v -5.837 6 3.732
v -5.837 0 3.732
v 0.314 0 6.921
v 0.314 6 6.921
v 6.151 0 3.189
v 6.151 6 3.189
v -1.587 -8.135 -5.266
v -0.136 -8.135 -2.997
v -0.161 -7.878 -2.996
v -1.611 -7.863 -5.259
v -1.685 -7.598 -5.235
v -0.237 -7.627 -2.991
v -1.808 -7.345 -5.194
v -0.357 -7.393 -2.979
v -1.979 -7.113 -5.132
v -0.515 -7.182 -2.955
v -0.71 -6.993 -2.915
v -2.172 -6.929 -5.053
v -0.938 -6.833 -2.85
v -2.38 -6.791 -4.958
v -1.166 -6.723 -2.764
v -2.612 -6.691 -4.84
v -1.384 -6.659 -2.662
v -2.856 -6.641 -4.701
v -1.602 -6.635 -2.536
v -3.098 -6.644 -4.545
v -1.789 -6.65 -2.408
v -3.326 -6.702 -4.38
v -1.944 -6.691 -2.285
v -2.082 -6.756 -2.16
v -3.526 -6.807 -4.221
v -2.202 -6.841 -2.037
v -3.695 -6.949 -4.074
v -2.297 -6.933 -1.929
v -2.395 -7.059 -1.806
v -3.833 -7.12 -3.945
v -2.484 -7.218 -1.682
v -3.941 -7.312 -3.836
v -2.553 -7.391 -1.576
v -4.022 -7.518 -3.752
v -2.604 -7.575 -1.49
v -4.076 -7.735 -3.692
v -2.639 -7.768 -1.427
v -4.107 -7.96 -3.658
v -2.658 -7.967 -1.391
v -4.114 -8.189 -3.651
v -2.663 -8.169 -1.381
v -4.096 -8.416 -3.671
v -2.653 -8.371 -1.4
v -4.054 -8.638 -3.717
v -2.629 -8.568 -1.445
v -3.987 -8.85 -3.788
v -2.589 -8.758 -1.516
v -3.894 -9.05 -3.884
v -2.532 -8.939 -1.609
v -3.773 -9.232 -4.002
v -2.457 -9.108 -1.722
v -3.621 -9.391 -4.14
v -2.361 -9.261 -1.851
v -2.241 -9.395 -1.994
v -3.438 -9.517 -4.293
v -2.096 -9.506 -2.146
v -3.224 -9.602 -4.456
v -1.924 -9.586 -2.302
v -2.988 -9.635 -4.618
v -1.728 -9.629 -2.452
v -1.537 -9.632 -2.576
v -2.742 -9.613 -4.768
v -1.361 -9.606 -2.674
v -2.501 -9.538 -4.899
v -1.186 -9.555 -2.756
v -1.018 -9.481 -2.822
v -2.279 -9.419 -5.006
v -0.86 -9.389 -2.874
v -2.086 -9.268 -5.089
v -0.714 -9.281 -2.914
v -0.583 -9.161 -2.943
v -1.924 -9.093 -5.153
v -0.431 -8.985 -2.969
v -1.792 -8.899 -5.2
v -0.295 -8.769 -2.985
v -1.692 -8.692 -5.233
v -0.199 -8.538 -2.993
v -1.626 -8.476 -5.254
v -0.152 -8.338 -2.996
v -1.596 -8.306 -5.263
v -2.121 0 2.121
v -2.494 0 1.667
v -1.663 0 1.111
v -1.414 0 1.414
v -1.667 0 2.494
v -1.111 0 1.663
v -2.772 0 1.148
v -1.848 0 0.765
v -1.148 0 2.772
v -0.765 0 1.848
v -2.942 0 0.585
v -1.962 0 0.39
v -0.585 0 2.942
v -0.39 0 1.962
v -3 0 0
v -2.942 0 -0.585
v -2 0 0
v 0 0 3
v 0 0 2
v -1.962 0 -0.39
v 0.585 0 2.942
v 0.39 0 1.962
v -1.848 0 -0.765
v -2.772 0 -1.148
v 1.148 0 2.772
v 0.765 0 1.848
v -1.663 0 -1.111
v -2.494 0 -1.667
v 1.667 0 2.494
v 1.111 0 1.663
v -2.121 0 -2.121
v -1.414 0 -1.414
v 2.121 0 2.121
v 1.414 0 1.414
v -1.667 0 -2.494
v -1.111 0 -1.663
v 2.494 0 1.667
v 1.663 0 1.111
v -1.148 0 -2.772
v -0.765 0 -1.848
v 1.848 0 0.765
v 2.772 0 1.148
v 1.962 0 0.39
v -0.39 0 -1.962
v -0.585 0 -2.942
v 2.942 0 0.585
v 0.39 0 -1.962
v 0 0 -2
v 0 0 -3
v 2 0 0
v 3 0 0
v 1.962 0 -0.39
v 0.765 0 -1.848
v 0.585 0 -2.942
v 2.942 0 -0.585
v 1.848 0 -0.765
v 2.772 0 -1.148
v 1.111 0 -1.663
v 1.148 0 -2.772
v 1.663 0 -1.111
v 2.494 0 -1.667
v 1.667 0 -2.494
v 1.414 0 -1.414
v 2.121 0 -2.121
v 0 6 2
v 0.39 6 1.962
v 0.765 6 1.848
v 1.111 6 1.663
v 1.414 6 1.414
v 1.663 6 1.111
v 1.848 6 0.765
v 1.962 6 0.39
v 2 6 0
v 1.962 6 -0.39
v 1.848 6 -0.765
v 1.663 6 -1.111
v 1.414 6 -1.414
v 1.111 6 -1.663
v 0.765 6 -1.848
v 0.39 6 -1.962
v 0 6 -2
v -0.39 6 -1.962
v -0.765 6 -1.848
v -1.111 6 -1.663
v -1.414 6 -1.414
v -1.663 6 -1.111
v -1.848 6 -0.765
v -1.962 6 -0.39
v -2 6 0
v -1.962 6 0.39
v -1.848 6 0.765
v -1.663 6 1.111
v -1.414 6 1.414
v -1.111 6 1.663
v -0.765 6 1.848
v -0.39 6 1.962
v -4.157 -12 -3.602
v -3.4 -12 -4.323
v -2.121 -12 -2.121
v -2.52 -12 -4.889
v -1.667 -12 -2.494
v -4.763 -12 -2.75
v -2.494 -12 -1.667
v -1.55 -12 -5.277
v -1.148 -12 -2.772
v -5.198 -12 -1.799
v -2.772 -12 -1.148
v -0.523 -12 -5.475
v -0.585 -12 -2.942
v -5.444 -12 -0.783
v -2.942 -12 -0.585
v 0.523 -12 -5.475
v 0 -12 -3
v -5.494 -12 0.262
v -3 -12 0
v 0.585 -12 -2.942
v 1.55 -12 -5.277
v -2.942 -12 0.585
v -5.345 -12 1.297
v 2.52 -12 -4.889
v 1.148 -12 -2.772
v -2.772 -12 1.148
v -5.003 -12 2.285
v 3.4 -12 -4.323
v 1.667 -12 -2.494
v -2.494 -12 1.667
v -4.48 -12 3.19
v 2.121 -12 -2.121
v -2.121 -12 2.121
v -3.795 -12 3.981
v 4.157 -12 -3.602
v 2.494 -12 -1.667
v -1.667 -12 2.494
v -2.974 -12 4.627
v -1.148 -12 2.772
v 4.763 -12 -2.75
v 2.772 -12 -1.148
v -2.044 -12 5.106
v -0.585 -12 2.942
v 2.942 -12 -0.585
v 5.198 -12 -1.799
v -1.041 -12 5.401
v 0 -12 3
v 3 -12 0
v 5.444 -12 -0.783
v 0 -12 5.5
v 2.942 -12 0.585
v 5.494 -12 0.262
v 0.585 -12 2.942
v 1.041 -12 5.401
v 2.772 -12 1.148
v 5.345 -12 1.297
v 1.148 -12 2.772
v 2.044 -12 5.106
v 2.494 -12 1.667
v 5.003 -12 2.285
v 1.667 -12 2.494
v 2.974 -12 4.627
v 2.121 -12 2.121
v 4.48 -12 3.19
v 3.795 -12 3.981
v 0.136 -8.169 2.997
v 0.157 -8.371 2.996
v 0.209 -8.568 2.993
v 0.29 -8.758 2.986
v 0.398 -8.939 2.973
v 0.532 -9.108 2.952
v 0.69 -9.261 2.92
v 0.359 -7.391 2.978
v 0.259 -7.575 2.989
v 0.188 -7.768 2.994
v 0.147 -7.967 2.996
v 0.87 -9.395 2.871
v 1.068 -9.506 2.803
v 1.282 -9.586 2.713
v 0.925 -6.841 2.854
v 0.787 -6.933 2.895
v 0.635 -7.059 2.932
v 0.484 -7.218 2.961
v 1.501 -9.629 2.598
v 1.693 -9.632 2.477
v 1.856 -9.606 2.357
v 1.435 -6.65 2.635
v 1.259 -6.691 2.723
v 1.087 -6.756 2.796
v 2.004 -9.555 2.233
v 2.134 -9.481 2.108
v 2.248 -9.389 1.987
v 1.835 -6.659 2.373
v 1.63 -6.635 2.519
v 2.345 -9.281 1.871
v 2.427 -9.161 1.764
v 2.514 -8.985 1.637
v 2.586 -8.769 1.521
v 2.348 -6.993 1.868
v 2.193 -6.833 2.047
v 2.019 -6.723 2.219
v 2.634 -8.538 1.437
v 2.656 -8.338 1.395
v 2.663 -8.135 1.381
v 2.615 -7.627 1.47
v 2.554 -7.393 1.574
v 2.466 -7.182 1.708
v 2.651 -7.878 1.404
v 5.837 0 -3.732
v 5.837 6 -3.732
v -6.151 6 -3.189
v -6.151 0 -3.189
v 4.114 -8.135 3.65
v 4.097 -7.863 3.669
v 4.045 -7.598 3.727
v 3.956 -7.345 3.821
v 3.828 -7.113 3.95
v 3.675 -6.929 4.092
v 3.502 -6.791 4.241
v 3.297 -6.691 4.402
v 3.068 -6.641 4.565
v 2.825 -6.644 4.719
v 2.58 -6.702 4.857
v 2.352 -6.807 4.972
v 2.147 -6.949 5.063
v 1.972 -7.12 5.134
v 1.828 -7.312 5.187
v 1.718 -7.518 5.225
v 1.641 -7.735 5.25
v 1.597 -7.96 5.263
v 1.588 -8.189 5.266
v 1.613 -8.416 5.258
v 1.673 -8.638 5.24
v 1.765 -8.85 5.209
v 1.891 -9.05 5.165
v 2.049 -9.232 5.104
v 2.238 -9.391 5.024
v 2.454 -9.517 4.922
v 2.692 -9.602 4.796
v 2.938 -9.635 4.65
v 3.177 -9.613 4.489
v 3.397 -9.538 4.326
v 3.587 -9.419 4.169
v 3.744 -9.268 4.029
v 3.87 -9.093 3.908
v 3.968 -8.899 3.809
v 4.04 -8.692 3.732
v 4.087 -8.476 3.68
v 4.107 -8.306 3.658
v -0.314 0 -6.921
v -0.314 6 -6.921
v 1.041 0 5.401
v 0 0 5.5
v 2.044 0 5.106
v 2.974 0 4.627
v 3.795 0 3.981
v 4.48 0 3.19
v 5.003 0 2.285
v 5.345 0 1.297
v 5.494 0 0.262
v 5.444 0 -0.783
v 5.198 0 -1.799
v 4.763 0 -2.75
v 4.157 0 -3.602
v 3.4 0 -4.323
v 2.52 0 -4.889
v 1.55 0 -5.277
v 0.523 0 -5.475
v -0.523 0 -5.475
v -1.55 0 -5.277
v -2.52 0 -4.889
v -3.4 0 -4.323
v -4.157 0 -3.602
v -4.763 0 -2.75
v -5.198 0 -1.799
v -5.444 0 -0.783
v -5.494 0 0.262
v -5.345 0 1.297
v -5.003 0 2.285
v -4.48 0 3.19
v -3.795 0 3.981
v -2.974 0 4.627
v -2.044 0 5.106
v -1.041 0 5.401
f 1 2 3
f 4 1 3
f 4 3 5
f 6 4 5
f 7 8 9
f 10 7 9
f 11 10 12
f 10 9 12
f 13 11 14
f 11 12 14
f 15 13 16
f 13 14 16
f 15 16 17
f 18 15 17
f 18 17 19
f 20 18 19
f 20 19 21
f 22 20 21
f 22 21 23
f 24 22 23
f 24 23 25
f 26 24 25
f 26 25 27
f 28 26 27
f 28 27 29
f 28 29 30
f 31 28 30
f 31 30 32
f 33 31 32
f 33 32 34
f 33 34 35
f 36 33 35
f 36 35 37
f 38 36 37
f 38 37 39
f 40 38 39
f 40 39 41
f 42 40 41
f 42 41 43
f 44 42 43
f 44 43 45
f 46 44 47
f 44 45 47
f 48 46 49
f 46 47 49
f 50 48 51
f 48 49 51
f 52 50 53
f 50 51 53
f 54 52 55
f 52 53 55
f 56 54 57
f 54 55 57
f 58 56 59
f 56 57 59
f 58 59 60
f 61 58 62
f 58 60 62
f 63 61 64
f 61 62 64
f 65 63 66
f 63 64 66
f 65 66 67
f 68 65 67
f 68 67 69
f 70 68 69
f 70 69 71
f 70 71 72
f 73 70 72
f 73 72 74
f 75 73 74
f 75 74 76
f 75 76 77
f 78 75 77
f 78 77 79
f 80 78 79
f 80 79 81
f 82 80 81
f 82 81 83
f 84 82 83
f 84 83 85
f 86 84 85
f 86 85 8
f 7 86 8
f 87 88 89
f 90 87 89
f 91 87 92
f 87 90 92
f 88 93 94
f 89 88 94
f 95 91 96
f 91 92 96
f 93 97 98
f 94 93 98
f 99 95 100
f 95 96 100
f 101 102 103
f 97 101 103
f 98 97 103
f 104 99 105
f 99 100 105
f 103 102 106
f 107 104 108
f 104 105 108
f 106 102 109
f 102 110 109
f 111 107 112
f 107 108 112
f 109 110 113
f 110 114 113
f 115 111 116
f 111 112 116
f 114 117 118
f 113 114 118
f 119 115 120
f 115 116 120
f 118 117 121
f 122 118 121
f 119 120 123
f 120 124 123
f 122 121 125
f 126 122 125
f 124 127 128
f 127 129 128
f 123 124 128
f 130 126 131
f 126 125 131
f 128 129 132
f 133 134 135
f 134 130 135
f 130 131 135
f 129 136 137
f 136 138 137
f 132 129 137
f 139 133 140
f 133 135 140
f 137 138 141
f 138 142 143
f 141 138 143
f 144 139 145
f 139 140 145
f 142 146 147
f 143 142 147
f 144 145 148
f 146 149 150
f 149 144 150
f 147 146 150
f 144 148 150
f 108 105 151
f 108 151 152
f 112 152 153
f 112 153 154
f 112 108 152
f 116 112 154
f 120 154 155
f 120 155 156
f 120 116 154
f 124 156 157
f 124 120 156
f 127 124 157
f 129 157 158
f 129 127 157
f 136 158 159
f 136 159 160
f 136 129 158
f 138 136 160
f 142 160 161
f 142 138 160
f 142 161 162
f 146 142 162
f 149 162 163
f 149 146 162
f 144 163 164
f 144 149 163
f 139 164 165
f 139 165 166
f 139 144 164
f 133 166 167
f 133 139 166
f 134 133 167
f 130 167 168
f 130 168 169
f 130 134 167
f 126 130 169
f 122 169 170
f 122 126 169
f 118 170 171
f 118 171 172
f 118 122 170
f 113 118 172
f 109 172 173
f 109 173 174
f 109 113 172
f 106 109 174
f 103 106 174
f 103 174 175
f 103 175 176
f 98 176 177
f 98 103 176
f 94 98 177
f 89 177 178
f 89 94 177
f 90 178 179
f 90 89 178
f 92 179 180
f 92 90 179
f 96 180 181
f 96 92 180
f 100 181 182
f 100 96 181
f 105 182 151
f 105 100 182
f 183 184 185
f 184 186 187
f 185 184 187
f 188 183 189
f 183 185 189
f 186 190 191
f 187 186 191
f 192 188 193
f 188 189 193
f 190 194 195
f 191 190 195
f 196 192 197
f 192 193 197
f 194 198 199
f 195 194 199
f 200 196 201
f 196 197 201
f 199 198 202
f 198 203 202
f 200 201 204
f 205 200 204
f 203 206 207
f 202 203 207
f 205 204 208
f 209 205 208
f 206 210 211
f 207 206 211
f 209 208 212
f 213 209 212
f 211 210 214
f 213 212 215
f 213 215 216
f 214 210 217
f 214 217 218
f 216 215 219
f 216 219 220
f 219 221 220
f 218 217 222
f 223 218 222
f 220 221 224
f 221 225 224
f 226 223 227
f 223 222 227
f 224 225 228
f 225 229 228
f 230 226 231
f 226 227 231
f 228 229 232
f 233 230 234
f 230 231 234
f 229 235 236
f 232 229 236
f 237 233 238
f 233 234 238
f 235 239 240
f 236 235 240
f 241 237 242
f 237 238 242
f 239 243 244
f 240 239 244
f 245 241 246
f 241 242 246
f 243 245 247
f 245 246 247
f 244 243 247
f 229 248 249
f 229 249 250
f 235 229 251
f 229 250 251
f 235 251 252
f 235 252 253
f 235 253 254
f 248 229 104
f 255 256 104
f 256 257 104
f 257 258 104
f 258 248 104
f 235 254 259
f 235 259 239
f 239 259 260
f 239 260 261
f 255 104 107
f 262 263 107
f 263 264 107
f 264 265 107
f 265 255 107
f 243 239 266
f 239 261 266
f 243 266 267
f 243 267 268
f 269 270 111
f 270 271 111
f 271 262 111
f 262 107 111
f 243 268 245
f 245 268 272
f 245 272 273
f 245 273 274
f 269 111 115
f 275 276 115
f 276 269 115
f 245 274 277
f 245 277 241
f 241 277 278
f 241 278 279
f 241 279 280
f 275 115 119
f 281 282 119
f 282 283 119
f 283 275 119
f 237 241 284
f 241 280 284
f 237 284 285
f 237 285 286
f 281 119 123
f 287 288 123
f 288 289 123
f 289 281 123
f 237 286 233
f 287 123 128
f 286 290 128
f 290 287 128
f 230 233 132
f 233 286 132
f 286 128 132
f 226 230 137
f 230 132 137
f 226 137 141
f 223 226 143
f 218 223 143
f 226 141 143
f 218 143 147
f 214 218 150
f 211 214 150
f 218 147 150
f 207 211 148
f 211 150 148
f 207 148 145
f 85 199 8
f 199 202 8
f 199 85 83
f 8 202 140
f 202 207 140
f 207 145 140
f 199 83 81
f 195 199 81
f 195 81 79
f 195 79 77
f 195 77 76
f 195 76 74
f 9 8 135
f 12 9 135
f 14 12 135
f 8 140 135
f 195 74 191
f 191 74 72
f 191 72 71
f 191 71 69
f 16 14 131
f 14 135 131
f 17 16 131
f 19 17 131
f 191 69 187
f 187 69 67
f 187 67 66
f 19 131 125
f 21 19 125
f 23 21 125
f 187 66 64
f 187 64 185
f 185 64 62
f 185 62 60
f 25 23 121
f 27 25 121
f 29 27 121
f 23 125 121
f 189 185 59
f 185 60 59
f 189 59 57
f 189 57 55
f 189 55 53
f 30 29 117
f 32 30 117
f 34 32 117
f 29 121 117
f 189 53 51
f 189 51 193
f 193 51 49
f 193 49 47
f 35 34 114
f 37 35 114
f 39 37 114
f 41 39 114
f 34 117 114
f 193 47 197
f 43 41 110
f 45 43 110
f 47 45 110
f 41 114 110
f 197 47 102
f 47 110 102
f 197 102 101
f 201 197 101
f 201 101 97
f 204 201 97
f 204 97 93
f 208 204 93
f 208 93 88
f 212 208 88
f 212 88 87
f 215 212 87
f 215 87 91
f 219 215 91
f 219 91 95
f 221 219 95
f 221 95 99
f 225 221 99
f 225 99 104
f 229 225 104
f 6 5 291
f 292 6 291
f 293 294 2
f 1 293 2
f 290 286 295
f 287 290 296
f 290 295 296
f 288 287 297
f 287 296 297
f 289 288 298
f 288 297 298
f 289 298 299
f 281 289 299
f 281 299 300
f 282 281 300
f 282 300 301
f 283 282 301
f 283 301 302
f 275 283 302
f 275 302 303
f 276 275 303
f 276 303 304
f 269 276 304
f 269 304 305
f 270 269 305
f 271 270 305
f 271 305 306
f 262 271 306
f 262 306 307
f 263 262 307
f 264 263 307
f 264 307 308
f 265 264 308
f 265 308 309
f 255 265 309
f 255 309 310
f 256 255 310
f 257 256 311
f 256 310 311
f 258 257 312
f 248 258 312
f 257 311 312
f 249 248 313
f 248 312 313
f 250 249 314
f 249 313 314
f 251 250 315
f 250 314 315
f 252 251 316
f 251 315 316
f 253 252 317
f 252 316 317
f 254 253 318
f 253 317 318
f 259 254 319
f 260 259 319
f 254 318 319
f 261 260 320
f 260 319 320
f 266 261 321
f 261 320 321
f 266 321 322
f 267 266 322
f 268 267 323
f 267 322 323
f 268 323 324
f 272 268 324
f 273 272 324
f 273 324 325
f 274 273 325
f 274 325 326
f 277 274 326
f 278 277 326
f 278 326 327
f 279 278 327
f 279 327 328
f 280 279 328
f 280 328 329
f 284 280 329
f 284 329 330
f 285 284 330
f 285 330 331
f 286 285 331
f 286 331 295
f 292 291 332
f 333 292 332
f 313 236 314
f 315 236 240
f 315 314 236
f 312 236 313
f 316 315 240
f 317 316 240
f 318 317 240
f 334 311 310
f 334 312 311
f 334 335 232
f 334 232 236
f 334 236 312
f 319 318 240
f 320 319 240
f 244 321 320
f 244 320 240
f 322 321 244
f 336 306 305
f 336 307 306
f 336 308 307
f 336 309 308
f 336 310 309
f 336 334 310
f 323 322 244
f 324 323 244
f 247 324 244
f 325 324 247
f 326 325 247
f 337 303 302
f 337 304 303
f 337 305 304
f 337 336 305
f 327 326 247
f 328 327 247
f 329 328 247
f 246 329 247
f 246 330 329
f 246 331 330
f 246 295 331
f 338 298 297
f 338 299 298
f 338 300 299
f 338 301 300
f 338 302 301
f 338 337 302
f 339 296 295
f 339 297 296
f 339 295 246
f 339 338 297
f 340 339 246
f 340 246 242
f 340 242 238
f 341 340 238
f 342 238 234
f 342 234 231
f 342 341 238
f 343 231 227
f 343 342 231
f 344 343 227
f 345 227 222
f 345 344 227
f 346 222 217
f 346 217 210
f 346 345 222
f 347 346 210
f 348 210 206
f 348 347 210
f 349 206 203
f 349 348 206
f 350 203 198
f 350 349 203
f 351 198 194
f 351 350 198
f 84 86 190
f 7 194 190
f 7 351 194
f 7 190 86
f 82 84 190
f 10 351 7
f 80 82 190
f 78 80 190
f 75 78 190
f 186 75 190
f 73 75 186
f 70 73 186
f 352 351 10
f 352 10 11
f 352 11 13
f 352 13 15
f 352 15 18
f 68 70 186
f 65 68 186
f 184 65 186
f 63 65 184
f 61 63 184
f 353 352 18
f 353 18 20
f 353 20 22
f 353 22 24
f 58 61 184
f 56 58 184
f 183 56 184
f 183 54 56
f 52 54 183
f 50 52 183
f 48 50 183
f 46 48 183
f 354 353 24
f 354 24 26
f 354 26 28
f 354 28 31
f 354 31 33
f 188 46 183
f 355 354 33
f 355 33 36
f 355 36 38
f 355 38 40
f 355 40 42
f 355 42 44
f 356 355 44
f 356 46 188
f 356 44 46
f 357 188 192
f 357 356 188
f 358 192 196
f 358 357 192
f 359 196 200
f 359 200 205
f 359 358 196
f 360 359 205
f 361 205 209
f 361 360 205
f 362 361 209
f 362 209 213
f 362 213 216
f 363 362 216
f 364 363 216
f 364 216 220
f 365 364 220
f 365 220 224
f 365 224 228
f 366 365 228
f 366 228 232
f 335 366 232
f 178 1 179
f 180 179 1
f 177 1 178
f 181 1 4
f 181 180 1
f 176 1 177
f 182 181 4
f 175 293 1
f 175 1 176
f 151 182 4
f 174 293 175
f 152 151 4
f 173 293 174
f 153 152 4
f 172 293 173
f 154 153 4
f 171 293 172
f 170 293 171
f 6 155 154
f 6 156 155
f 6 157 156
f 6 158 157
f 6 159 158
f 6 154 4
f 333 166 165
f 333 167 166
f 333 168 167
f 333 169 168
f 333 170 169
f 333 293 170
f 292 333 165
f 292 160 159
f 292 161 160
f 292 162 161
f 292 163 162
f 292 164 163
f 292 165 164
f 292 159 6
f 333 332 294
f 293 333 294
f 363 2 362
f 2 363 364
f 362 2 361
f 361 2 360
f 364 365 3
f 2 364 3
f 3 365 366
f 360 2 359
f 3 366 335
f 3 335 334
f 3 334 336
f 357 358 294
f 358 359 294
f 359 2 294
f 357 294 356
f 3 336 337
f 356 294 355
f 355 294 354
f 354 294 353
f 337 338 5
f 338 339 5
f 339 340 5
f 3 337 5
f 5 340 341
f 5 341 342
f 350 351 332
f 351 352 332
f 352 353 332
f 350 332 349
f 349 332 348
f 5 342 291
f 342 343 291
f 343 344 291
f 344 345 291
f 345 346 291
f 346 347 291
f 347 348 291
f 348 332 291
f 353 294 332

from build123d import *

# Parameters (mm, degrees)
SKETCH_1_R          = 2
EXTRUDE_1_DEPTH     = 6
SKETCH_1_3_R        = 5.5
SKETCH_1_3_R_2      = 3
EXTRUDE_2_DEPTH     = 12
SKETCH_2_R          = 1.5
CUT_EXTRUDE_1_DEPTH = 30


with BuildPart() as part:
    # 草图1 → 凸台-拉伸1 (new body)
    with BuildSketch(Plane(origin=(0, 0, 0), x_dir=(1, 0, 0), z_dir=(0, 1, 0))):
        Polygon((5.837094583, 3.732067367), (-0.313517857, 6.921105876), (-6.15061244, 3.18903851), (-5.837094583, -3.732067367), (0.313517857, -6.921105876), (6.15061244, -3.18903851), align=None)
        Circle(SKETCH_1_R, mode=Mode.SUBTRACT)
    extrude(amount=EXTRUDE_1_DEPTH)

    # 草图1<3> → 凸台-拉伸2 (add)
    with BuildSketch(Plane(origin=(0, 0, 0), x_dir=(1, 0, 0), z_dir=(0, 1, 0))):
        Circle(SKETCH_1_3_R)
        Circle(SKETCH_1_3_R_2, mode=Mode.SUBTRACT)
    extrude(amount=-EXTRUDE_2_DEPTH)

    # 草图2 → 切除-拉伸1 (cut)
    with BuildSketch(Plane(origin=(3.232065148, 0, 5.055072193), x_dir=(0.8425120321737304, 0, -0.5386775247237361), z_dir=(0.538677524723736, 0, 0.8425120321737303))):
        with Locations((0, -8.135313369)):
            Circle(SKETCH_2_R)
    extrude(amount=-CUT_EXTRUDE_1_DEPTH, mode=Mode.SUBTRACT)


solid = part.part
